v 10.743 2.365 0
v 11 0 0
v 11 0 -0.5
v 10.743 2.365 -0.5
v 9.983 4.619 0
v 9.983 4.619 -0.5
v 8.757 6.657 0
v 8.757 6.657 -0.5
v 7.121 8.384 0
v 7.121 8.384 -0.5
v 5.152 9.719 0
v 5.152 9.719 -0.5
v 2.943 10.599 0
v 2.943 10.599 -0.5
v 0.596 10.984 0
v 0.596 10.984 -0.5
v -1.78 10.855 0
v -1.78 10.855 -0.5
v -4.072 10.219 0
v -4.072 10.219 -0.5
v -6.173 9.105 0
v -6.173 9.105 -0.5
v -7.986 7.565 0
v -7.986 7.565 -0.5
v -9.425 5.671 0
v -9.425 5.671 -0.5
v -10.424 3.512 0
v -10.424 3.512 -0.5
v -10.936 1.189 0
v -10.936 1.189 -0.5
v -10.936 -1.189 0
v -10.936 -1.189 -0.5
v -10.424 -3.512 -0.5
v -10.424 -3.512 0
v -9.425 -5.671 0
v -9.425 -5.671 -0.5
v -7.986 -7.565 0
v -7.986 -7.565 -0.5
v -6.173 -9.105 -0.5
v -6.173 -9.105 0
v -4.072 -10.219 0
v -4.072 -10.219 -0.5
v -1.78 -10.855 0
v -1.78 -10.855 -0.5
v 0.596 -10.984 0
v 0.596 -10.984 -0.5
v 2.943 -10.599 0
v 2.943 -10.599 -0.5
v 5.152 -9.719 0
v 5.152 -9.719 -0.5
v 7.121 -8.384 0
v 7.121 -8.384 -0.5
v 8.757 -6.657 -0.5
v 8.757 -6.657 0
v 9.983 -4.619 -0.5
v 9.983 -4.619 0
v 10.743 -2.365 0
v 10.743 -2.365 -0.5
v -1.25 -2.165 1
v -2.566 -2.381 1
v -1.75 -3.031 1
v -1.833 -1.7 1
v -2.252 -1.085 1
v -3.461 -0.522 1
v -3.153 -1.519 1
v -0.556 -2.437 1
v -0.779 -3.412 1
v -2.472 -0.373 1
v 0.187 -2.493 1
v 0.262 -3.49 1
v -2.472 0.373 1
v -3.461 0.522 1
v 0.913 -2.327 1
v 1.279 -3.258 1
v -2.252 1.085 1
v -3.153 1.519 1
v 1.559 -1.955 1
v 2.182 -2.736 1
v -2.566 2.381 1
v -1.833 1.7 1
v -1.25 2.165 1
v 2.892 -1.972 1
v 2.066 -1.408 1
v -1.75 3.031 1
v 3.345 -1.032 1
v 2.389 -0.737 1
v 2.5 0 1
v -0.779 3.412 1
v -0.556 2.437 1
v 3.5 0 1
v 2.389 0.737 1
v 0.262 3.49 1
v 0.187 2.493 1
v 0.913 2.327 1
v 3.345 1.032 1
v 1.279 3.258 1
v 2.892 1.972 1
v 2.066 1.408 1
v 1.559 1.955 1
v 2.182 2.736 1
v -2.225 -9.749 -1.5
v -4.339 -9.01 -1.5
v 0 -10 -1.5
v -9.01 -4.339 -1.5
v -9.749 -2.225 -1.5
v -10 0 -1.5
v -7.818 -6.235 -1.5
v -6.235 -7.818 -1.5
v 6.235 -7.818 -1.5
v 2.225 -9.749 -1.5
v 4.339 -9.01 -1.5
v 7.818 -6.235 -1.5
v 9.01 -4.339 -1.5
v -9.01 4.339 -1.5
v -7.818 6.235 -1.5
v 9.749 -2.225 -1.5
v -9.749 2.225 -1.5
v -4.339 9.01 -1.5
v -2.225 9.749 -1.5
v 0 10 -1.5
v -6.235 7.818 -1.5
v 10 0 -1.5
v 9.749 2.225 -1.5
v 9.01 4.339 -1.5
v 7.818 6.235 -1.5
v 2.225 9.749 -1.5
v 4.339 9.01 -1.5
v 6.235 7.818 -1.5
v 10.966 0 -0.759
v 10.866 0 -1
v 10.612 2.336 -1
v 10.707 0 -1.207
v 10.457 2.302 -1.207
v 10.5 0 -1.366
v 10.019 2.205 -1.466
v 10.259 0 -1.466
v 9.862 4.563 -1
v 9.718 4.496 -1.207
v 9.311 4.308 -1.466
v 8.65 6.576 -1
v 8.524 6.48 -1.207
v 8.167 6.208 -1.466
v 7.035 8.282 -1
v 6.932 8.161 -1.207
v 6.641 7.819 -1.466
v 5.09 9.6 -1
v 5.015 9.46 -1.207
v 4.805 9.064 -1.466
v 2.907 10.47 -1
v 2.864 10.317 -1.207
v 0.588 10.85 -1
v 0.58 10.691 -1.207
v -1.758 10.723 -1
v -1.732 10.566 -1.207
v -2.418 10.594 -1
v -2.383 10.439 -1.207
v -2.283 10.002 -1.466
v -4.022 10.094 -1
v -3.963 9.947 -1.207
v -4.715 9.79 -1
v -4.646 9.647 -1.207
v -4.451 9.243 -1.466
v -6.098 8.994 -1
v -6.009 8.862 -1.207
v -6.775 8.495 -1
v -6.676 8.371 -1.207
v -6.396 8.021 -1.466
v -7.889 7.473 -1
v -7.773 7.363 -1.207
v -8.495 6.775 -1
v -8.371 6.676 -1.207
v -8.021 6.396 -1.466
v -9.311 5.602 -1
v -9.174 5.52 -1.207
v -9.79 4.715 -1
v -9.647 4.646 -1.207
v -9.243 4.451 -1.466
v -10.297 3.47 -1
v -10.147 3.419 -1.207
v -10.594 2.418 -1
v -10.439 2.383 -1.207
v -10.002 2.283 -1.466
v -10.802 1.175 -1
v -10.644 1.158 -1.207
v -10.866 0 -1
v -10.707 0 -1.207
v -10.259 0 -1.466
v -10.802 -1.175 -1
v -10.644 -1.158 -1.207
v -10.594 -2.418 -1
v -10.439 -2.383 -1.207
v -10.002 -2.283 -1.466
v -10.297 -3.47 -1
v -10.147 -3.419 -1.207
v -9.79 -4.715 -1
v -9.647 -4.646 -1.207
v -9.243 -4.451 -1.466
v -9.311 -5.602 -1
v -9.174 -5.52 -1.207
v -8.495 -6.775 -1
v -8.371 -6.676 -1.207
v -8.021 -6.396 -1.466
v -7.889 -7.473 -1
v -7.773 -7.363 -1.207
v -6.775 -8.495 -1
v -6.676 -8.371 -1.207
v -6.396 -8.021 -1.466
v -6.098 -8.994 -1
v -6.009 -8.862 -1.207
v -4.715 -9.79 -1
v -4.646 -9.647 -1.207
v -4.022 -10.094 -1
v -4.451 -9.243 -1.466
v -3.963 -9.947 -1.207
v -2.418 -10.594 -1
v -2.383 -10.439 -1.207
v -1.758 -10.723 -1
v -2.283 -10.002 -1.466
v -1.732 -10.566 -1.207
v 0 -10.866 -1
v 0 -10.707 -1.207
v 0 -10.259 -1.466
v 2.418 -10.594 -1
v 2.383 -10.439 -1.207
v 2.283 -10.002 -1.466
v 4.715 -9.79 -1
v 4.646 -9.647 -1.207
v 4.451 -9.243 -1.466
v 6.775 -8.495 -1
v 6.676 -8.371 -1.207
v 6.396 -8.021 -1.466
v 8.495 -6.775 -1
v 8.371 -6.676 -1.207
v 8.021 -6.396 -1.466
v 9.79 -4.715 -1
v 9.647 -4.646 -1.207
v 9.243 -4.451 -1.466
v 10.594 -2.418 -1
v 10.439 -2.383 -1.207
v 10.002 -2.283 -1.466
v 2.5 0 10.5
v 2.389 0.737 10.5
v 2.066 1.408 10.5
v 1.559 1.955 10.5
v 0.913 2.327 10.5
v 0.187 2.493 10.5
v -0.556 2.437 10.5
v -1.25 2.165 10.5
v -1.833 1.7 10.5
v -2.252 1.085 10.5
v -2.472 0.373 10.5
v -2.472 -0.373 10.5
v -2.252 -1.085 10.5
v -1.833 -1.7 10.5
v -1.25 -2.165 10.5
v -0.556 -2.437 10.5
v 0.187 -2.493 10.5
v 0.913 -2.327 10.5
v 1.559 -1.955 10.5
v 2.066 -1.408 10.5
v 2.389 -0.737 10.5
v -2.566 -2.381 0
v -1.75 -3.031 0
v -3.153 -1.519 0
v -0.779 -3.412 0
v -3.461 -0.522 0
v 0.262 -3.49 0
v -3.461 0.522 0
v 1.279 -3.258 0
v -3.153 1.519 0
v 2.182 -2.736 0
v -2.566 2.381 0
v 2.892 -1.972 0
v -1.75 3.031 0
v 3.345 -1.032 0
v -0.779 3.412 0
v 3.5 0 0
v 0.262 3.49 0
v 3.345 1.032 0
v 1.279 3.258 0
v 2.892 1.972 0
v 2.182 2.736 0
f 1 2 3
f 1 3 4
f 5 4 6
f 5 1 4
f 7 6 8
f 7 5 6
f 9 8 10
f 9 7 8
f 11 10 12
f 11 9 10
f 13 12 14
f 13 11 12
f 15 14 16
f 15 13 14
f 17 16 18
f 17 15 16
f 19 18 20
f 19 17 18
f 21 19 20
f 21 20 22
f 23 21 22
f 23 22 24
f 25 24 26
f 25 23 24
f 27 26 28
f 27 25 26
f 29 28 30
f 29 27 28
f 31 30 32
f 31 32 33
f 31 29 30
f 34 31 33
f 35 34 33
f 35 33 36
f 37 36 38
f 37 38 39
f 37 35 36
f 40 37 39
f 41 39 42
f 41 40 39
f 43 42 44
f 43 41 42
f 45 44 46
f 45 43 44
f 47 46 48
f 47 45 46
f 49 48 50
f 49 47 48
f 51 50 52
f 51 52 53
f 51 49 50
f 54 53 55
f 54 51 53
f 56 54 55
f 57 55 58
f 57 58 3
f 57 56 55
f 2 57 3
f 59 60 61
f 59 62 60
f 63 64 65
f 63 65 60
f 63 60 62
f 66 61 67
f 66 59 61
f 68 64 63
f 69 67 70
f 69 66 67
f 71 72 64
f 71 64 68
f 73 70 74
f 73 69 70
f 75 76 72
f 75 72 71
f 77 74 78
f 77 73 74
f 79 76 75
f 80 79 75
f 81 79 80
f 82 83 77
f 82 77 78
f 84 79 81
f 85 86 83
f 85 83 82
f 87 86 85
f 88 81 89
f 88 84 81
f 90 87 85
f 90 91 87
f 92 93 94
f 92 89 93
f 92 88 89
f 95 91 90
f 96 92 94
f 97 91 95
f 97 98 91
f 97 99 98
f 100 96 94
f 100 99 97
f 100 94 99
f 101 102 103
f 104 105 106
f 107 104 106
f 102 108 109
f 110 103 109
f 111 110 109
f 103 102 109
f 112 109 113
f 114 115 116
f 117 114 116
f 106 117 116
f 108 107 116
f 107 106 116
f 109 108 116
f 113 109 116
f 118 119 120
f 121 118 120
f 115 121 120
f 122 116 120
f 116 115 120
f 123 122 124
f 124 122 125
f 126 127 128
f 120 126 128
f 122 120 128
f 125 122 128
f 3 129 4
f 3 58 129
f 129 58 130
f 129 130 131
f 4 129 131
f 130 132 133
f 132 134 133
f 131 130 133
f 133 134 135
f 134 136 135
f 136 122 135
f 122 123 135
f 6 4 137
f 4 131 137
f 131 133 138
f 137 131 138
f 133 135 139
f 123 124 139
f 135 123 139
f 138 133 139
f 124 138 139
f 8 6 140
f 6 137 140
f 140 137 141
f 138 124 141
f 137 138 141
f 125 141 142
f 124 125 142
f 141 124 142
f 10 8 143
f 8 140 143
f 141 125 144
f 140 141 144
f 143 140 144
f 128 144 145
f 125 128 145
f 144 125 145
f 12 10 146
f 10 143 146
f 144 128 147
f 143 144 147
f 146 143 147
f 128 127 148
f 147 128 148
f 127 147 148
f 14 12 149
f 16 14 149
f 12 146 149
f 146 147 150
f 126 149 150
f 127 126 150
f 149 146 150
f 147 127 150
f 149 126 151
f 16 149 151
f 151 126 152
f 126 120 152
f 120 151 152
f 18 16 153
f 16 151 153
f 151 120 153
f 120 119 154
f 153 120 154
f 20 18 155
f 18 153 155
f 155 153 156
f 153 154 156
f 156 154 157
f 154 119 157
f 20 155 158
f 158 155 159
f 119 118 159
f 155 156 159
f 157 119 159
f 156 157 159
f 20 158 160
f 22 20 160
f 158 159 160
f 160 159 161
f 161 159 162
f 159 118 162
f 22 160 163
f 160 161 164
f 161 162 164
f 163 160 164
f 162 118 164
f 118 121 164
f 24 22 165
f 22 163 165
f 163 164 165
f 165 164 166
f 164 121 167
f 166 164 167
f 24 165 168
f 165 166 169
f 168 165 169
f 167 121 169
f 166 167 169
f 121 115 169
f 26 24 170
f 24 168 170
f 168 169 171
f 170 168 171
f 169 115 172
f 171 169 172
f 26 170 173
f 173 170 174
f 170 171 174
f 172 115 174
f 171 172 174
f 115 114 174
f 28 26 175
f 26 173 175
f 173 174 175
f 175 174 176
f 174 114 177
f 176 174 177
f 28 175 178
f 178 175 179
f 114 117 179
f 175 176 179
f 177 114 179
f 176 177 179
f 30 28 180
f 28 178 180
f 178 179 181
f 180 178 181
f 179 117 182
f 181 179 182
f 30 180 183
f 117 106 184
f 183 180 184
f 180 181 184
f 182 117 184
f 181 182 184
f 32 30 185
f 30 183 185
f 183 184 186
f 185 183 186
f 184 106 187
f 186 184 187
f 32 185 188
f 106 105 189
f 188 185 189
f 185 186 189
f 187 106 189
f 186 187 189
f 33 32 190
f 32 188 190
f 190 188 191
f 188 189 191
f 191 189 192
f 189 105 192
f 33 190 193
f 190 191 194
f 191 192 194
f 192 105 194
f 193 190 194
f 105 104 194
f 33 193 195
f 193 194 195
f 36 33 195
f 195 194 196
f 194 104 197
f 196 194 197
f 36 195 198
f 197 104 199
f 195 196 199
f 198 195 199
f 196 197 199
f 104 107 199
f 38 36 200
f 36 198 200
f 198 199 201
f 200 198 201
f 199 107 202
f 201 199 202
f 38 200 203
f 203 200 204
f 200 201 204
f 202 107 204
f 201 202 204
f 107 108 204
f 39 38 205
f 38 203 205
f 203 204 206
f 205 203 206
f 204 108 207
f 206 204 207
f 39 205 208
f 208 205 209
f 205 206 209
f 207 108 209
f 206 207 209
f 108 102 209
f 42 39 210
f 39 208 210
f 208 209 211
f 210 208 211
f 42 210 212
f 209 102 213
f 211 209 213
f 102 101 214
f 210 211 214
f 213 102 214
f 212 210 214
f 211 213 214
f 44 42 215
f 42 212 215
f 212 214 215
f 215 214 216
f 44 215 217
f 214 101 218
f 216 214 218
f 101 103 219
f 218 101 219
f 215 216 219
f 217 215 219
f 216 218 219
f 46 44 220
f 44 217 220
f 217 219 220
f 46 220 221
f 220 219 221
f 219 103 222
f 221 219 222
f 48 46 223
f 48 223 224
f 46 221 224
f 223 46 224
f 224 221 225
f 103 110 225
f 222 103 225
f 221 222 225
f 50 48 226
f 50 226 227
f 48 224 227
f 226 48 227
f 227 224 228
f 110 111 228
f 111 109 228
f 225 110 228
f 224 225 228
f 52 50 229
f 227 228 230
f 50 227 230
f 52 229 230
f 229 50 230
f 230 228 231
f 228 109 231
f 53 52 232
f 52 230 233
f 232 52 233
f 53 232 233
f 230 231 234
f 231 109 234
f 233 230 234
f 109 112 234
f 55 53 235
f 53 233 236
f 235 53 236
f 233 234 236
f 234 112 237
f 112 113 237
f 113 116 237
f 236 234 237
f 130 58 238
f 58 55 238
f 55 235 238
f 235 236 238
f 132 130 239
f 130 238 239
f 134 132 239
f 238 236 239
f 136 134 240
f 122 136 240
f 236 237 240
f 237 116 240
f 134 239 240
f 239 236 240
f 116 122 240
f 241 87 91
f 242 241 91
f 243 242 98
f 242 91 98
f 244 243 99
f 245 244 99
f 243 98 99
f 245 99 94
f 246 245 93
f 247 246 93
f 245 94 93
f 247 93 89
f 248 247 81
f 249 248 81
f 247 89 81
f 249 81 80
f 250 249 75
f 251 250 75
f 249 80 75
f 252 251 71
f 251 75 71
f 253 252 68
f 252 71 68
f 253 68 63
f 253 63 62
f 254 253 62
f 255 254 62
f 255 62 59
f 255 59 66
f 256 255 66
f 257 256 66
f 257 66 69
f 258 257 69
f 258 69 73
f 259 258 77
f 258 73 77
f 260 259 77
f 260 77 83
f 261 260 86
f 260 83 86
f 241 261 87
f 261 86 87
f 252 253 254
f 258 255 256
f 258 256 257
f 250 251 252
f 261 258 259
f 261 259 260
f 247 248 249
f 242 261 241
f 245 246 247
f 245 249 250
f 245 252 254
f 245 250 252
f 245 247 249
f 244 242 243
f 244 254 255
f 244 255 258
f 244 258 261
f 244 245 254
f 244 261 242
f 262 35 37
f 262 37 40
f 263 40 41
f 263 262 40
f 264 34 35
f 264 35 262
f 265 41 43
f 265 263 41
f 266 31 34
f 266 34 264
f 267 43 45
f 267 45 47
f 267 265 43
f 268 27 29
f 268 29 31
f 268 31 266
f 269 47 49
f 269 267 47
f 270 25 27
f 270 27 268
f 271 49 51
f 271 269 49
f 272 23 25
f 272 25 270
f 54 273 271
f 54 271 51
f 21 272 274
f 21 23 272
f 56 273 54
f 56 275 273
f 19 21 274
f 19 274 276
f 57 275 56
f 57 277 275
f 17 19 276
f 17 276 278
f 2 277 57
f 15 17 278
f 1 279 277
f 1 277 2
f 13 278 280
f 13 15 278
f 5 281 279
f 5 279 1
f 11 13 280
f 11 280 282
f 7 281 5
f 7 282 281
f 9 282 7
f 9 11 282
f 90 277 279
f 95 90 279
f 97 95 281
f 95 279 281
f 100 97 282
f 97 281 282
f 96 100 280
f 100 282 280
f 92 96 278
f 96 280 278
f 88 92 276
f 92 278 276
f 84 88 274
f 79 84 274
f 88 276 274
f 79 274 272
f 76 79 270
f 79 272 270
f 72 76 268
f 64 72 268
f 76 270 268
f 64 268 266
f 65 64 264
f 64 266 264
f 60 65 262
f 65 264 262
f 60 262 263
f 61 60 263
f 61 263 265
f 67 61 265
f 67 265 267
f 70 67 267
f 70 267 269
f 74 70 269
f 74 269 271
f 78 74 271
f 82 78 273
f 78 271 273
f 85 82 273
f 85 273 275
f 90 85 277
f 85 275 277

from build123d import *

# Parameters (mm, degrees)
F0_R     = 11
F1_DEPTH = 1.5
F2_R     = 3.5
F3_DEPTH = 1
F4_R     = 2.5
F5_DEPTH = 9.5
F6_R     = 1


with BuildPart() as f1:
    # F0 (on Top) → F1 (new body)
    with BuildSketch(Plane.XY):
        Circle(F0_R)
    extrude(amount=-F1_DEPTH)

    # F2 (on face) → F3 (join)
    with BuildSketch(Plane.XY):
        Circle(F2_R)
    extrude(amount=F3_DEPTH)

    # F4 (on face) → F5 (join)
    with BuildSketch(Plane.XY.offset(1)):
        Circle(F4_R)
    extrude(amount=F5_DEPTH)

    # F6
    f6_edges = [f1.edges().sort_by_distance(p)[0] for p in [
        (-11, 0, -1.5),
    ]]
    fillet(f6_edges, radius=F6_R)


solid = f1.part
